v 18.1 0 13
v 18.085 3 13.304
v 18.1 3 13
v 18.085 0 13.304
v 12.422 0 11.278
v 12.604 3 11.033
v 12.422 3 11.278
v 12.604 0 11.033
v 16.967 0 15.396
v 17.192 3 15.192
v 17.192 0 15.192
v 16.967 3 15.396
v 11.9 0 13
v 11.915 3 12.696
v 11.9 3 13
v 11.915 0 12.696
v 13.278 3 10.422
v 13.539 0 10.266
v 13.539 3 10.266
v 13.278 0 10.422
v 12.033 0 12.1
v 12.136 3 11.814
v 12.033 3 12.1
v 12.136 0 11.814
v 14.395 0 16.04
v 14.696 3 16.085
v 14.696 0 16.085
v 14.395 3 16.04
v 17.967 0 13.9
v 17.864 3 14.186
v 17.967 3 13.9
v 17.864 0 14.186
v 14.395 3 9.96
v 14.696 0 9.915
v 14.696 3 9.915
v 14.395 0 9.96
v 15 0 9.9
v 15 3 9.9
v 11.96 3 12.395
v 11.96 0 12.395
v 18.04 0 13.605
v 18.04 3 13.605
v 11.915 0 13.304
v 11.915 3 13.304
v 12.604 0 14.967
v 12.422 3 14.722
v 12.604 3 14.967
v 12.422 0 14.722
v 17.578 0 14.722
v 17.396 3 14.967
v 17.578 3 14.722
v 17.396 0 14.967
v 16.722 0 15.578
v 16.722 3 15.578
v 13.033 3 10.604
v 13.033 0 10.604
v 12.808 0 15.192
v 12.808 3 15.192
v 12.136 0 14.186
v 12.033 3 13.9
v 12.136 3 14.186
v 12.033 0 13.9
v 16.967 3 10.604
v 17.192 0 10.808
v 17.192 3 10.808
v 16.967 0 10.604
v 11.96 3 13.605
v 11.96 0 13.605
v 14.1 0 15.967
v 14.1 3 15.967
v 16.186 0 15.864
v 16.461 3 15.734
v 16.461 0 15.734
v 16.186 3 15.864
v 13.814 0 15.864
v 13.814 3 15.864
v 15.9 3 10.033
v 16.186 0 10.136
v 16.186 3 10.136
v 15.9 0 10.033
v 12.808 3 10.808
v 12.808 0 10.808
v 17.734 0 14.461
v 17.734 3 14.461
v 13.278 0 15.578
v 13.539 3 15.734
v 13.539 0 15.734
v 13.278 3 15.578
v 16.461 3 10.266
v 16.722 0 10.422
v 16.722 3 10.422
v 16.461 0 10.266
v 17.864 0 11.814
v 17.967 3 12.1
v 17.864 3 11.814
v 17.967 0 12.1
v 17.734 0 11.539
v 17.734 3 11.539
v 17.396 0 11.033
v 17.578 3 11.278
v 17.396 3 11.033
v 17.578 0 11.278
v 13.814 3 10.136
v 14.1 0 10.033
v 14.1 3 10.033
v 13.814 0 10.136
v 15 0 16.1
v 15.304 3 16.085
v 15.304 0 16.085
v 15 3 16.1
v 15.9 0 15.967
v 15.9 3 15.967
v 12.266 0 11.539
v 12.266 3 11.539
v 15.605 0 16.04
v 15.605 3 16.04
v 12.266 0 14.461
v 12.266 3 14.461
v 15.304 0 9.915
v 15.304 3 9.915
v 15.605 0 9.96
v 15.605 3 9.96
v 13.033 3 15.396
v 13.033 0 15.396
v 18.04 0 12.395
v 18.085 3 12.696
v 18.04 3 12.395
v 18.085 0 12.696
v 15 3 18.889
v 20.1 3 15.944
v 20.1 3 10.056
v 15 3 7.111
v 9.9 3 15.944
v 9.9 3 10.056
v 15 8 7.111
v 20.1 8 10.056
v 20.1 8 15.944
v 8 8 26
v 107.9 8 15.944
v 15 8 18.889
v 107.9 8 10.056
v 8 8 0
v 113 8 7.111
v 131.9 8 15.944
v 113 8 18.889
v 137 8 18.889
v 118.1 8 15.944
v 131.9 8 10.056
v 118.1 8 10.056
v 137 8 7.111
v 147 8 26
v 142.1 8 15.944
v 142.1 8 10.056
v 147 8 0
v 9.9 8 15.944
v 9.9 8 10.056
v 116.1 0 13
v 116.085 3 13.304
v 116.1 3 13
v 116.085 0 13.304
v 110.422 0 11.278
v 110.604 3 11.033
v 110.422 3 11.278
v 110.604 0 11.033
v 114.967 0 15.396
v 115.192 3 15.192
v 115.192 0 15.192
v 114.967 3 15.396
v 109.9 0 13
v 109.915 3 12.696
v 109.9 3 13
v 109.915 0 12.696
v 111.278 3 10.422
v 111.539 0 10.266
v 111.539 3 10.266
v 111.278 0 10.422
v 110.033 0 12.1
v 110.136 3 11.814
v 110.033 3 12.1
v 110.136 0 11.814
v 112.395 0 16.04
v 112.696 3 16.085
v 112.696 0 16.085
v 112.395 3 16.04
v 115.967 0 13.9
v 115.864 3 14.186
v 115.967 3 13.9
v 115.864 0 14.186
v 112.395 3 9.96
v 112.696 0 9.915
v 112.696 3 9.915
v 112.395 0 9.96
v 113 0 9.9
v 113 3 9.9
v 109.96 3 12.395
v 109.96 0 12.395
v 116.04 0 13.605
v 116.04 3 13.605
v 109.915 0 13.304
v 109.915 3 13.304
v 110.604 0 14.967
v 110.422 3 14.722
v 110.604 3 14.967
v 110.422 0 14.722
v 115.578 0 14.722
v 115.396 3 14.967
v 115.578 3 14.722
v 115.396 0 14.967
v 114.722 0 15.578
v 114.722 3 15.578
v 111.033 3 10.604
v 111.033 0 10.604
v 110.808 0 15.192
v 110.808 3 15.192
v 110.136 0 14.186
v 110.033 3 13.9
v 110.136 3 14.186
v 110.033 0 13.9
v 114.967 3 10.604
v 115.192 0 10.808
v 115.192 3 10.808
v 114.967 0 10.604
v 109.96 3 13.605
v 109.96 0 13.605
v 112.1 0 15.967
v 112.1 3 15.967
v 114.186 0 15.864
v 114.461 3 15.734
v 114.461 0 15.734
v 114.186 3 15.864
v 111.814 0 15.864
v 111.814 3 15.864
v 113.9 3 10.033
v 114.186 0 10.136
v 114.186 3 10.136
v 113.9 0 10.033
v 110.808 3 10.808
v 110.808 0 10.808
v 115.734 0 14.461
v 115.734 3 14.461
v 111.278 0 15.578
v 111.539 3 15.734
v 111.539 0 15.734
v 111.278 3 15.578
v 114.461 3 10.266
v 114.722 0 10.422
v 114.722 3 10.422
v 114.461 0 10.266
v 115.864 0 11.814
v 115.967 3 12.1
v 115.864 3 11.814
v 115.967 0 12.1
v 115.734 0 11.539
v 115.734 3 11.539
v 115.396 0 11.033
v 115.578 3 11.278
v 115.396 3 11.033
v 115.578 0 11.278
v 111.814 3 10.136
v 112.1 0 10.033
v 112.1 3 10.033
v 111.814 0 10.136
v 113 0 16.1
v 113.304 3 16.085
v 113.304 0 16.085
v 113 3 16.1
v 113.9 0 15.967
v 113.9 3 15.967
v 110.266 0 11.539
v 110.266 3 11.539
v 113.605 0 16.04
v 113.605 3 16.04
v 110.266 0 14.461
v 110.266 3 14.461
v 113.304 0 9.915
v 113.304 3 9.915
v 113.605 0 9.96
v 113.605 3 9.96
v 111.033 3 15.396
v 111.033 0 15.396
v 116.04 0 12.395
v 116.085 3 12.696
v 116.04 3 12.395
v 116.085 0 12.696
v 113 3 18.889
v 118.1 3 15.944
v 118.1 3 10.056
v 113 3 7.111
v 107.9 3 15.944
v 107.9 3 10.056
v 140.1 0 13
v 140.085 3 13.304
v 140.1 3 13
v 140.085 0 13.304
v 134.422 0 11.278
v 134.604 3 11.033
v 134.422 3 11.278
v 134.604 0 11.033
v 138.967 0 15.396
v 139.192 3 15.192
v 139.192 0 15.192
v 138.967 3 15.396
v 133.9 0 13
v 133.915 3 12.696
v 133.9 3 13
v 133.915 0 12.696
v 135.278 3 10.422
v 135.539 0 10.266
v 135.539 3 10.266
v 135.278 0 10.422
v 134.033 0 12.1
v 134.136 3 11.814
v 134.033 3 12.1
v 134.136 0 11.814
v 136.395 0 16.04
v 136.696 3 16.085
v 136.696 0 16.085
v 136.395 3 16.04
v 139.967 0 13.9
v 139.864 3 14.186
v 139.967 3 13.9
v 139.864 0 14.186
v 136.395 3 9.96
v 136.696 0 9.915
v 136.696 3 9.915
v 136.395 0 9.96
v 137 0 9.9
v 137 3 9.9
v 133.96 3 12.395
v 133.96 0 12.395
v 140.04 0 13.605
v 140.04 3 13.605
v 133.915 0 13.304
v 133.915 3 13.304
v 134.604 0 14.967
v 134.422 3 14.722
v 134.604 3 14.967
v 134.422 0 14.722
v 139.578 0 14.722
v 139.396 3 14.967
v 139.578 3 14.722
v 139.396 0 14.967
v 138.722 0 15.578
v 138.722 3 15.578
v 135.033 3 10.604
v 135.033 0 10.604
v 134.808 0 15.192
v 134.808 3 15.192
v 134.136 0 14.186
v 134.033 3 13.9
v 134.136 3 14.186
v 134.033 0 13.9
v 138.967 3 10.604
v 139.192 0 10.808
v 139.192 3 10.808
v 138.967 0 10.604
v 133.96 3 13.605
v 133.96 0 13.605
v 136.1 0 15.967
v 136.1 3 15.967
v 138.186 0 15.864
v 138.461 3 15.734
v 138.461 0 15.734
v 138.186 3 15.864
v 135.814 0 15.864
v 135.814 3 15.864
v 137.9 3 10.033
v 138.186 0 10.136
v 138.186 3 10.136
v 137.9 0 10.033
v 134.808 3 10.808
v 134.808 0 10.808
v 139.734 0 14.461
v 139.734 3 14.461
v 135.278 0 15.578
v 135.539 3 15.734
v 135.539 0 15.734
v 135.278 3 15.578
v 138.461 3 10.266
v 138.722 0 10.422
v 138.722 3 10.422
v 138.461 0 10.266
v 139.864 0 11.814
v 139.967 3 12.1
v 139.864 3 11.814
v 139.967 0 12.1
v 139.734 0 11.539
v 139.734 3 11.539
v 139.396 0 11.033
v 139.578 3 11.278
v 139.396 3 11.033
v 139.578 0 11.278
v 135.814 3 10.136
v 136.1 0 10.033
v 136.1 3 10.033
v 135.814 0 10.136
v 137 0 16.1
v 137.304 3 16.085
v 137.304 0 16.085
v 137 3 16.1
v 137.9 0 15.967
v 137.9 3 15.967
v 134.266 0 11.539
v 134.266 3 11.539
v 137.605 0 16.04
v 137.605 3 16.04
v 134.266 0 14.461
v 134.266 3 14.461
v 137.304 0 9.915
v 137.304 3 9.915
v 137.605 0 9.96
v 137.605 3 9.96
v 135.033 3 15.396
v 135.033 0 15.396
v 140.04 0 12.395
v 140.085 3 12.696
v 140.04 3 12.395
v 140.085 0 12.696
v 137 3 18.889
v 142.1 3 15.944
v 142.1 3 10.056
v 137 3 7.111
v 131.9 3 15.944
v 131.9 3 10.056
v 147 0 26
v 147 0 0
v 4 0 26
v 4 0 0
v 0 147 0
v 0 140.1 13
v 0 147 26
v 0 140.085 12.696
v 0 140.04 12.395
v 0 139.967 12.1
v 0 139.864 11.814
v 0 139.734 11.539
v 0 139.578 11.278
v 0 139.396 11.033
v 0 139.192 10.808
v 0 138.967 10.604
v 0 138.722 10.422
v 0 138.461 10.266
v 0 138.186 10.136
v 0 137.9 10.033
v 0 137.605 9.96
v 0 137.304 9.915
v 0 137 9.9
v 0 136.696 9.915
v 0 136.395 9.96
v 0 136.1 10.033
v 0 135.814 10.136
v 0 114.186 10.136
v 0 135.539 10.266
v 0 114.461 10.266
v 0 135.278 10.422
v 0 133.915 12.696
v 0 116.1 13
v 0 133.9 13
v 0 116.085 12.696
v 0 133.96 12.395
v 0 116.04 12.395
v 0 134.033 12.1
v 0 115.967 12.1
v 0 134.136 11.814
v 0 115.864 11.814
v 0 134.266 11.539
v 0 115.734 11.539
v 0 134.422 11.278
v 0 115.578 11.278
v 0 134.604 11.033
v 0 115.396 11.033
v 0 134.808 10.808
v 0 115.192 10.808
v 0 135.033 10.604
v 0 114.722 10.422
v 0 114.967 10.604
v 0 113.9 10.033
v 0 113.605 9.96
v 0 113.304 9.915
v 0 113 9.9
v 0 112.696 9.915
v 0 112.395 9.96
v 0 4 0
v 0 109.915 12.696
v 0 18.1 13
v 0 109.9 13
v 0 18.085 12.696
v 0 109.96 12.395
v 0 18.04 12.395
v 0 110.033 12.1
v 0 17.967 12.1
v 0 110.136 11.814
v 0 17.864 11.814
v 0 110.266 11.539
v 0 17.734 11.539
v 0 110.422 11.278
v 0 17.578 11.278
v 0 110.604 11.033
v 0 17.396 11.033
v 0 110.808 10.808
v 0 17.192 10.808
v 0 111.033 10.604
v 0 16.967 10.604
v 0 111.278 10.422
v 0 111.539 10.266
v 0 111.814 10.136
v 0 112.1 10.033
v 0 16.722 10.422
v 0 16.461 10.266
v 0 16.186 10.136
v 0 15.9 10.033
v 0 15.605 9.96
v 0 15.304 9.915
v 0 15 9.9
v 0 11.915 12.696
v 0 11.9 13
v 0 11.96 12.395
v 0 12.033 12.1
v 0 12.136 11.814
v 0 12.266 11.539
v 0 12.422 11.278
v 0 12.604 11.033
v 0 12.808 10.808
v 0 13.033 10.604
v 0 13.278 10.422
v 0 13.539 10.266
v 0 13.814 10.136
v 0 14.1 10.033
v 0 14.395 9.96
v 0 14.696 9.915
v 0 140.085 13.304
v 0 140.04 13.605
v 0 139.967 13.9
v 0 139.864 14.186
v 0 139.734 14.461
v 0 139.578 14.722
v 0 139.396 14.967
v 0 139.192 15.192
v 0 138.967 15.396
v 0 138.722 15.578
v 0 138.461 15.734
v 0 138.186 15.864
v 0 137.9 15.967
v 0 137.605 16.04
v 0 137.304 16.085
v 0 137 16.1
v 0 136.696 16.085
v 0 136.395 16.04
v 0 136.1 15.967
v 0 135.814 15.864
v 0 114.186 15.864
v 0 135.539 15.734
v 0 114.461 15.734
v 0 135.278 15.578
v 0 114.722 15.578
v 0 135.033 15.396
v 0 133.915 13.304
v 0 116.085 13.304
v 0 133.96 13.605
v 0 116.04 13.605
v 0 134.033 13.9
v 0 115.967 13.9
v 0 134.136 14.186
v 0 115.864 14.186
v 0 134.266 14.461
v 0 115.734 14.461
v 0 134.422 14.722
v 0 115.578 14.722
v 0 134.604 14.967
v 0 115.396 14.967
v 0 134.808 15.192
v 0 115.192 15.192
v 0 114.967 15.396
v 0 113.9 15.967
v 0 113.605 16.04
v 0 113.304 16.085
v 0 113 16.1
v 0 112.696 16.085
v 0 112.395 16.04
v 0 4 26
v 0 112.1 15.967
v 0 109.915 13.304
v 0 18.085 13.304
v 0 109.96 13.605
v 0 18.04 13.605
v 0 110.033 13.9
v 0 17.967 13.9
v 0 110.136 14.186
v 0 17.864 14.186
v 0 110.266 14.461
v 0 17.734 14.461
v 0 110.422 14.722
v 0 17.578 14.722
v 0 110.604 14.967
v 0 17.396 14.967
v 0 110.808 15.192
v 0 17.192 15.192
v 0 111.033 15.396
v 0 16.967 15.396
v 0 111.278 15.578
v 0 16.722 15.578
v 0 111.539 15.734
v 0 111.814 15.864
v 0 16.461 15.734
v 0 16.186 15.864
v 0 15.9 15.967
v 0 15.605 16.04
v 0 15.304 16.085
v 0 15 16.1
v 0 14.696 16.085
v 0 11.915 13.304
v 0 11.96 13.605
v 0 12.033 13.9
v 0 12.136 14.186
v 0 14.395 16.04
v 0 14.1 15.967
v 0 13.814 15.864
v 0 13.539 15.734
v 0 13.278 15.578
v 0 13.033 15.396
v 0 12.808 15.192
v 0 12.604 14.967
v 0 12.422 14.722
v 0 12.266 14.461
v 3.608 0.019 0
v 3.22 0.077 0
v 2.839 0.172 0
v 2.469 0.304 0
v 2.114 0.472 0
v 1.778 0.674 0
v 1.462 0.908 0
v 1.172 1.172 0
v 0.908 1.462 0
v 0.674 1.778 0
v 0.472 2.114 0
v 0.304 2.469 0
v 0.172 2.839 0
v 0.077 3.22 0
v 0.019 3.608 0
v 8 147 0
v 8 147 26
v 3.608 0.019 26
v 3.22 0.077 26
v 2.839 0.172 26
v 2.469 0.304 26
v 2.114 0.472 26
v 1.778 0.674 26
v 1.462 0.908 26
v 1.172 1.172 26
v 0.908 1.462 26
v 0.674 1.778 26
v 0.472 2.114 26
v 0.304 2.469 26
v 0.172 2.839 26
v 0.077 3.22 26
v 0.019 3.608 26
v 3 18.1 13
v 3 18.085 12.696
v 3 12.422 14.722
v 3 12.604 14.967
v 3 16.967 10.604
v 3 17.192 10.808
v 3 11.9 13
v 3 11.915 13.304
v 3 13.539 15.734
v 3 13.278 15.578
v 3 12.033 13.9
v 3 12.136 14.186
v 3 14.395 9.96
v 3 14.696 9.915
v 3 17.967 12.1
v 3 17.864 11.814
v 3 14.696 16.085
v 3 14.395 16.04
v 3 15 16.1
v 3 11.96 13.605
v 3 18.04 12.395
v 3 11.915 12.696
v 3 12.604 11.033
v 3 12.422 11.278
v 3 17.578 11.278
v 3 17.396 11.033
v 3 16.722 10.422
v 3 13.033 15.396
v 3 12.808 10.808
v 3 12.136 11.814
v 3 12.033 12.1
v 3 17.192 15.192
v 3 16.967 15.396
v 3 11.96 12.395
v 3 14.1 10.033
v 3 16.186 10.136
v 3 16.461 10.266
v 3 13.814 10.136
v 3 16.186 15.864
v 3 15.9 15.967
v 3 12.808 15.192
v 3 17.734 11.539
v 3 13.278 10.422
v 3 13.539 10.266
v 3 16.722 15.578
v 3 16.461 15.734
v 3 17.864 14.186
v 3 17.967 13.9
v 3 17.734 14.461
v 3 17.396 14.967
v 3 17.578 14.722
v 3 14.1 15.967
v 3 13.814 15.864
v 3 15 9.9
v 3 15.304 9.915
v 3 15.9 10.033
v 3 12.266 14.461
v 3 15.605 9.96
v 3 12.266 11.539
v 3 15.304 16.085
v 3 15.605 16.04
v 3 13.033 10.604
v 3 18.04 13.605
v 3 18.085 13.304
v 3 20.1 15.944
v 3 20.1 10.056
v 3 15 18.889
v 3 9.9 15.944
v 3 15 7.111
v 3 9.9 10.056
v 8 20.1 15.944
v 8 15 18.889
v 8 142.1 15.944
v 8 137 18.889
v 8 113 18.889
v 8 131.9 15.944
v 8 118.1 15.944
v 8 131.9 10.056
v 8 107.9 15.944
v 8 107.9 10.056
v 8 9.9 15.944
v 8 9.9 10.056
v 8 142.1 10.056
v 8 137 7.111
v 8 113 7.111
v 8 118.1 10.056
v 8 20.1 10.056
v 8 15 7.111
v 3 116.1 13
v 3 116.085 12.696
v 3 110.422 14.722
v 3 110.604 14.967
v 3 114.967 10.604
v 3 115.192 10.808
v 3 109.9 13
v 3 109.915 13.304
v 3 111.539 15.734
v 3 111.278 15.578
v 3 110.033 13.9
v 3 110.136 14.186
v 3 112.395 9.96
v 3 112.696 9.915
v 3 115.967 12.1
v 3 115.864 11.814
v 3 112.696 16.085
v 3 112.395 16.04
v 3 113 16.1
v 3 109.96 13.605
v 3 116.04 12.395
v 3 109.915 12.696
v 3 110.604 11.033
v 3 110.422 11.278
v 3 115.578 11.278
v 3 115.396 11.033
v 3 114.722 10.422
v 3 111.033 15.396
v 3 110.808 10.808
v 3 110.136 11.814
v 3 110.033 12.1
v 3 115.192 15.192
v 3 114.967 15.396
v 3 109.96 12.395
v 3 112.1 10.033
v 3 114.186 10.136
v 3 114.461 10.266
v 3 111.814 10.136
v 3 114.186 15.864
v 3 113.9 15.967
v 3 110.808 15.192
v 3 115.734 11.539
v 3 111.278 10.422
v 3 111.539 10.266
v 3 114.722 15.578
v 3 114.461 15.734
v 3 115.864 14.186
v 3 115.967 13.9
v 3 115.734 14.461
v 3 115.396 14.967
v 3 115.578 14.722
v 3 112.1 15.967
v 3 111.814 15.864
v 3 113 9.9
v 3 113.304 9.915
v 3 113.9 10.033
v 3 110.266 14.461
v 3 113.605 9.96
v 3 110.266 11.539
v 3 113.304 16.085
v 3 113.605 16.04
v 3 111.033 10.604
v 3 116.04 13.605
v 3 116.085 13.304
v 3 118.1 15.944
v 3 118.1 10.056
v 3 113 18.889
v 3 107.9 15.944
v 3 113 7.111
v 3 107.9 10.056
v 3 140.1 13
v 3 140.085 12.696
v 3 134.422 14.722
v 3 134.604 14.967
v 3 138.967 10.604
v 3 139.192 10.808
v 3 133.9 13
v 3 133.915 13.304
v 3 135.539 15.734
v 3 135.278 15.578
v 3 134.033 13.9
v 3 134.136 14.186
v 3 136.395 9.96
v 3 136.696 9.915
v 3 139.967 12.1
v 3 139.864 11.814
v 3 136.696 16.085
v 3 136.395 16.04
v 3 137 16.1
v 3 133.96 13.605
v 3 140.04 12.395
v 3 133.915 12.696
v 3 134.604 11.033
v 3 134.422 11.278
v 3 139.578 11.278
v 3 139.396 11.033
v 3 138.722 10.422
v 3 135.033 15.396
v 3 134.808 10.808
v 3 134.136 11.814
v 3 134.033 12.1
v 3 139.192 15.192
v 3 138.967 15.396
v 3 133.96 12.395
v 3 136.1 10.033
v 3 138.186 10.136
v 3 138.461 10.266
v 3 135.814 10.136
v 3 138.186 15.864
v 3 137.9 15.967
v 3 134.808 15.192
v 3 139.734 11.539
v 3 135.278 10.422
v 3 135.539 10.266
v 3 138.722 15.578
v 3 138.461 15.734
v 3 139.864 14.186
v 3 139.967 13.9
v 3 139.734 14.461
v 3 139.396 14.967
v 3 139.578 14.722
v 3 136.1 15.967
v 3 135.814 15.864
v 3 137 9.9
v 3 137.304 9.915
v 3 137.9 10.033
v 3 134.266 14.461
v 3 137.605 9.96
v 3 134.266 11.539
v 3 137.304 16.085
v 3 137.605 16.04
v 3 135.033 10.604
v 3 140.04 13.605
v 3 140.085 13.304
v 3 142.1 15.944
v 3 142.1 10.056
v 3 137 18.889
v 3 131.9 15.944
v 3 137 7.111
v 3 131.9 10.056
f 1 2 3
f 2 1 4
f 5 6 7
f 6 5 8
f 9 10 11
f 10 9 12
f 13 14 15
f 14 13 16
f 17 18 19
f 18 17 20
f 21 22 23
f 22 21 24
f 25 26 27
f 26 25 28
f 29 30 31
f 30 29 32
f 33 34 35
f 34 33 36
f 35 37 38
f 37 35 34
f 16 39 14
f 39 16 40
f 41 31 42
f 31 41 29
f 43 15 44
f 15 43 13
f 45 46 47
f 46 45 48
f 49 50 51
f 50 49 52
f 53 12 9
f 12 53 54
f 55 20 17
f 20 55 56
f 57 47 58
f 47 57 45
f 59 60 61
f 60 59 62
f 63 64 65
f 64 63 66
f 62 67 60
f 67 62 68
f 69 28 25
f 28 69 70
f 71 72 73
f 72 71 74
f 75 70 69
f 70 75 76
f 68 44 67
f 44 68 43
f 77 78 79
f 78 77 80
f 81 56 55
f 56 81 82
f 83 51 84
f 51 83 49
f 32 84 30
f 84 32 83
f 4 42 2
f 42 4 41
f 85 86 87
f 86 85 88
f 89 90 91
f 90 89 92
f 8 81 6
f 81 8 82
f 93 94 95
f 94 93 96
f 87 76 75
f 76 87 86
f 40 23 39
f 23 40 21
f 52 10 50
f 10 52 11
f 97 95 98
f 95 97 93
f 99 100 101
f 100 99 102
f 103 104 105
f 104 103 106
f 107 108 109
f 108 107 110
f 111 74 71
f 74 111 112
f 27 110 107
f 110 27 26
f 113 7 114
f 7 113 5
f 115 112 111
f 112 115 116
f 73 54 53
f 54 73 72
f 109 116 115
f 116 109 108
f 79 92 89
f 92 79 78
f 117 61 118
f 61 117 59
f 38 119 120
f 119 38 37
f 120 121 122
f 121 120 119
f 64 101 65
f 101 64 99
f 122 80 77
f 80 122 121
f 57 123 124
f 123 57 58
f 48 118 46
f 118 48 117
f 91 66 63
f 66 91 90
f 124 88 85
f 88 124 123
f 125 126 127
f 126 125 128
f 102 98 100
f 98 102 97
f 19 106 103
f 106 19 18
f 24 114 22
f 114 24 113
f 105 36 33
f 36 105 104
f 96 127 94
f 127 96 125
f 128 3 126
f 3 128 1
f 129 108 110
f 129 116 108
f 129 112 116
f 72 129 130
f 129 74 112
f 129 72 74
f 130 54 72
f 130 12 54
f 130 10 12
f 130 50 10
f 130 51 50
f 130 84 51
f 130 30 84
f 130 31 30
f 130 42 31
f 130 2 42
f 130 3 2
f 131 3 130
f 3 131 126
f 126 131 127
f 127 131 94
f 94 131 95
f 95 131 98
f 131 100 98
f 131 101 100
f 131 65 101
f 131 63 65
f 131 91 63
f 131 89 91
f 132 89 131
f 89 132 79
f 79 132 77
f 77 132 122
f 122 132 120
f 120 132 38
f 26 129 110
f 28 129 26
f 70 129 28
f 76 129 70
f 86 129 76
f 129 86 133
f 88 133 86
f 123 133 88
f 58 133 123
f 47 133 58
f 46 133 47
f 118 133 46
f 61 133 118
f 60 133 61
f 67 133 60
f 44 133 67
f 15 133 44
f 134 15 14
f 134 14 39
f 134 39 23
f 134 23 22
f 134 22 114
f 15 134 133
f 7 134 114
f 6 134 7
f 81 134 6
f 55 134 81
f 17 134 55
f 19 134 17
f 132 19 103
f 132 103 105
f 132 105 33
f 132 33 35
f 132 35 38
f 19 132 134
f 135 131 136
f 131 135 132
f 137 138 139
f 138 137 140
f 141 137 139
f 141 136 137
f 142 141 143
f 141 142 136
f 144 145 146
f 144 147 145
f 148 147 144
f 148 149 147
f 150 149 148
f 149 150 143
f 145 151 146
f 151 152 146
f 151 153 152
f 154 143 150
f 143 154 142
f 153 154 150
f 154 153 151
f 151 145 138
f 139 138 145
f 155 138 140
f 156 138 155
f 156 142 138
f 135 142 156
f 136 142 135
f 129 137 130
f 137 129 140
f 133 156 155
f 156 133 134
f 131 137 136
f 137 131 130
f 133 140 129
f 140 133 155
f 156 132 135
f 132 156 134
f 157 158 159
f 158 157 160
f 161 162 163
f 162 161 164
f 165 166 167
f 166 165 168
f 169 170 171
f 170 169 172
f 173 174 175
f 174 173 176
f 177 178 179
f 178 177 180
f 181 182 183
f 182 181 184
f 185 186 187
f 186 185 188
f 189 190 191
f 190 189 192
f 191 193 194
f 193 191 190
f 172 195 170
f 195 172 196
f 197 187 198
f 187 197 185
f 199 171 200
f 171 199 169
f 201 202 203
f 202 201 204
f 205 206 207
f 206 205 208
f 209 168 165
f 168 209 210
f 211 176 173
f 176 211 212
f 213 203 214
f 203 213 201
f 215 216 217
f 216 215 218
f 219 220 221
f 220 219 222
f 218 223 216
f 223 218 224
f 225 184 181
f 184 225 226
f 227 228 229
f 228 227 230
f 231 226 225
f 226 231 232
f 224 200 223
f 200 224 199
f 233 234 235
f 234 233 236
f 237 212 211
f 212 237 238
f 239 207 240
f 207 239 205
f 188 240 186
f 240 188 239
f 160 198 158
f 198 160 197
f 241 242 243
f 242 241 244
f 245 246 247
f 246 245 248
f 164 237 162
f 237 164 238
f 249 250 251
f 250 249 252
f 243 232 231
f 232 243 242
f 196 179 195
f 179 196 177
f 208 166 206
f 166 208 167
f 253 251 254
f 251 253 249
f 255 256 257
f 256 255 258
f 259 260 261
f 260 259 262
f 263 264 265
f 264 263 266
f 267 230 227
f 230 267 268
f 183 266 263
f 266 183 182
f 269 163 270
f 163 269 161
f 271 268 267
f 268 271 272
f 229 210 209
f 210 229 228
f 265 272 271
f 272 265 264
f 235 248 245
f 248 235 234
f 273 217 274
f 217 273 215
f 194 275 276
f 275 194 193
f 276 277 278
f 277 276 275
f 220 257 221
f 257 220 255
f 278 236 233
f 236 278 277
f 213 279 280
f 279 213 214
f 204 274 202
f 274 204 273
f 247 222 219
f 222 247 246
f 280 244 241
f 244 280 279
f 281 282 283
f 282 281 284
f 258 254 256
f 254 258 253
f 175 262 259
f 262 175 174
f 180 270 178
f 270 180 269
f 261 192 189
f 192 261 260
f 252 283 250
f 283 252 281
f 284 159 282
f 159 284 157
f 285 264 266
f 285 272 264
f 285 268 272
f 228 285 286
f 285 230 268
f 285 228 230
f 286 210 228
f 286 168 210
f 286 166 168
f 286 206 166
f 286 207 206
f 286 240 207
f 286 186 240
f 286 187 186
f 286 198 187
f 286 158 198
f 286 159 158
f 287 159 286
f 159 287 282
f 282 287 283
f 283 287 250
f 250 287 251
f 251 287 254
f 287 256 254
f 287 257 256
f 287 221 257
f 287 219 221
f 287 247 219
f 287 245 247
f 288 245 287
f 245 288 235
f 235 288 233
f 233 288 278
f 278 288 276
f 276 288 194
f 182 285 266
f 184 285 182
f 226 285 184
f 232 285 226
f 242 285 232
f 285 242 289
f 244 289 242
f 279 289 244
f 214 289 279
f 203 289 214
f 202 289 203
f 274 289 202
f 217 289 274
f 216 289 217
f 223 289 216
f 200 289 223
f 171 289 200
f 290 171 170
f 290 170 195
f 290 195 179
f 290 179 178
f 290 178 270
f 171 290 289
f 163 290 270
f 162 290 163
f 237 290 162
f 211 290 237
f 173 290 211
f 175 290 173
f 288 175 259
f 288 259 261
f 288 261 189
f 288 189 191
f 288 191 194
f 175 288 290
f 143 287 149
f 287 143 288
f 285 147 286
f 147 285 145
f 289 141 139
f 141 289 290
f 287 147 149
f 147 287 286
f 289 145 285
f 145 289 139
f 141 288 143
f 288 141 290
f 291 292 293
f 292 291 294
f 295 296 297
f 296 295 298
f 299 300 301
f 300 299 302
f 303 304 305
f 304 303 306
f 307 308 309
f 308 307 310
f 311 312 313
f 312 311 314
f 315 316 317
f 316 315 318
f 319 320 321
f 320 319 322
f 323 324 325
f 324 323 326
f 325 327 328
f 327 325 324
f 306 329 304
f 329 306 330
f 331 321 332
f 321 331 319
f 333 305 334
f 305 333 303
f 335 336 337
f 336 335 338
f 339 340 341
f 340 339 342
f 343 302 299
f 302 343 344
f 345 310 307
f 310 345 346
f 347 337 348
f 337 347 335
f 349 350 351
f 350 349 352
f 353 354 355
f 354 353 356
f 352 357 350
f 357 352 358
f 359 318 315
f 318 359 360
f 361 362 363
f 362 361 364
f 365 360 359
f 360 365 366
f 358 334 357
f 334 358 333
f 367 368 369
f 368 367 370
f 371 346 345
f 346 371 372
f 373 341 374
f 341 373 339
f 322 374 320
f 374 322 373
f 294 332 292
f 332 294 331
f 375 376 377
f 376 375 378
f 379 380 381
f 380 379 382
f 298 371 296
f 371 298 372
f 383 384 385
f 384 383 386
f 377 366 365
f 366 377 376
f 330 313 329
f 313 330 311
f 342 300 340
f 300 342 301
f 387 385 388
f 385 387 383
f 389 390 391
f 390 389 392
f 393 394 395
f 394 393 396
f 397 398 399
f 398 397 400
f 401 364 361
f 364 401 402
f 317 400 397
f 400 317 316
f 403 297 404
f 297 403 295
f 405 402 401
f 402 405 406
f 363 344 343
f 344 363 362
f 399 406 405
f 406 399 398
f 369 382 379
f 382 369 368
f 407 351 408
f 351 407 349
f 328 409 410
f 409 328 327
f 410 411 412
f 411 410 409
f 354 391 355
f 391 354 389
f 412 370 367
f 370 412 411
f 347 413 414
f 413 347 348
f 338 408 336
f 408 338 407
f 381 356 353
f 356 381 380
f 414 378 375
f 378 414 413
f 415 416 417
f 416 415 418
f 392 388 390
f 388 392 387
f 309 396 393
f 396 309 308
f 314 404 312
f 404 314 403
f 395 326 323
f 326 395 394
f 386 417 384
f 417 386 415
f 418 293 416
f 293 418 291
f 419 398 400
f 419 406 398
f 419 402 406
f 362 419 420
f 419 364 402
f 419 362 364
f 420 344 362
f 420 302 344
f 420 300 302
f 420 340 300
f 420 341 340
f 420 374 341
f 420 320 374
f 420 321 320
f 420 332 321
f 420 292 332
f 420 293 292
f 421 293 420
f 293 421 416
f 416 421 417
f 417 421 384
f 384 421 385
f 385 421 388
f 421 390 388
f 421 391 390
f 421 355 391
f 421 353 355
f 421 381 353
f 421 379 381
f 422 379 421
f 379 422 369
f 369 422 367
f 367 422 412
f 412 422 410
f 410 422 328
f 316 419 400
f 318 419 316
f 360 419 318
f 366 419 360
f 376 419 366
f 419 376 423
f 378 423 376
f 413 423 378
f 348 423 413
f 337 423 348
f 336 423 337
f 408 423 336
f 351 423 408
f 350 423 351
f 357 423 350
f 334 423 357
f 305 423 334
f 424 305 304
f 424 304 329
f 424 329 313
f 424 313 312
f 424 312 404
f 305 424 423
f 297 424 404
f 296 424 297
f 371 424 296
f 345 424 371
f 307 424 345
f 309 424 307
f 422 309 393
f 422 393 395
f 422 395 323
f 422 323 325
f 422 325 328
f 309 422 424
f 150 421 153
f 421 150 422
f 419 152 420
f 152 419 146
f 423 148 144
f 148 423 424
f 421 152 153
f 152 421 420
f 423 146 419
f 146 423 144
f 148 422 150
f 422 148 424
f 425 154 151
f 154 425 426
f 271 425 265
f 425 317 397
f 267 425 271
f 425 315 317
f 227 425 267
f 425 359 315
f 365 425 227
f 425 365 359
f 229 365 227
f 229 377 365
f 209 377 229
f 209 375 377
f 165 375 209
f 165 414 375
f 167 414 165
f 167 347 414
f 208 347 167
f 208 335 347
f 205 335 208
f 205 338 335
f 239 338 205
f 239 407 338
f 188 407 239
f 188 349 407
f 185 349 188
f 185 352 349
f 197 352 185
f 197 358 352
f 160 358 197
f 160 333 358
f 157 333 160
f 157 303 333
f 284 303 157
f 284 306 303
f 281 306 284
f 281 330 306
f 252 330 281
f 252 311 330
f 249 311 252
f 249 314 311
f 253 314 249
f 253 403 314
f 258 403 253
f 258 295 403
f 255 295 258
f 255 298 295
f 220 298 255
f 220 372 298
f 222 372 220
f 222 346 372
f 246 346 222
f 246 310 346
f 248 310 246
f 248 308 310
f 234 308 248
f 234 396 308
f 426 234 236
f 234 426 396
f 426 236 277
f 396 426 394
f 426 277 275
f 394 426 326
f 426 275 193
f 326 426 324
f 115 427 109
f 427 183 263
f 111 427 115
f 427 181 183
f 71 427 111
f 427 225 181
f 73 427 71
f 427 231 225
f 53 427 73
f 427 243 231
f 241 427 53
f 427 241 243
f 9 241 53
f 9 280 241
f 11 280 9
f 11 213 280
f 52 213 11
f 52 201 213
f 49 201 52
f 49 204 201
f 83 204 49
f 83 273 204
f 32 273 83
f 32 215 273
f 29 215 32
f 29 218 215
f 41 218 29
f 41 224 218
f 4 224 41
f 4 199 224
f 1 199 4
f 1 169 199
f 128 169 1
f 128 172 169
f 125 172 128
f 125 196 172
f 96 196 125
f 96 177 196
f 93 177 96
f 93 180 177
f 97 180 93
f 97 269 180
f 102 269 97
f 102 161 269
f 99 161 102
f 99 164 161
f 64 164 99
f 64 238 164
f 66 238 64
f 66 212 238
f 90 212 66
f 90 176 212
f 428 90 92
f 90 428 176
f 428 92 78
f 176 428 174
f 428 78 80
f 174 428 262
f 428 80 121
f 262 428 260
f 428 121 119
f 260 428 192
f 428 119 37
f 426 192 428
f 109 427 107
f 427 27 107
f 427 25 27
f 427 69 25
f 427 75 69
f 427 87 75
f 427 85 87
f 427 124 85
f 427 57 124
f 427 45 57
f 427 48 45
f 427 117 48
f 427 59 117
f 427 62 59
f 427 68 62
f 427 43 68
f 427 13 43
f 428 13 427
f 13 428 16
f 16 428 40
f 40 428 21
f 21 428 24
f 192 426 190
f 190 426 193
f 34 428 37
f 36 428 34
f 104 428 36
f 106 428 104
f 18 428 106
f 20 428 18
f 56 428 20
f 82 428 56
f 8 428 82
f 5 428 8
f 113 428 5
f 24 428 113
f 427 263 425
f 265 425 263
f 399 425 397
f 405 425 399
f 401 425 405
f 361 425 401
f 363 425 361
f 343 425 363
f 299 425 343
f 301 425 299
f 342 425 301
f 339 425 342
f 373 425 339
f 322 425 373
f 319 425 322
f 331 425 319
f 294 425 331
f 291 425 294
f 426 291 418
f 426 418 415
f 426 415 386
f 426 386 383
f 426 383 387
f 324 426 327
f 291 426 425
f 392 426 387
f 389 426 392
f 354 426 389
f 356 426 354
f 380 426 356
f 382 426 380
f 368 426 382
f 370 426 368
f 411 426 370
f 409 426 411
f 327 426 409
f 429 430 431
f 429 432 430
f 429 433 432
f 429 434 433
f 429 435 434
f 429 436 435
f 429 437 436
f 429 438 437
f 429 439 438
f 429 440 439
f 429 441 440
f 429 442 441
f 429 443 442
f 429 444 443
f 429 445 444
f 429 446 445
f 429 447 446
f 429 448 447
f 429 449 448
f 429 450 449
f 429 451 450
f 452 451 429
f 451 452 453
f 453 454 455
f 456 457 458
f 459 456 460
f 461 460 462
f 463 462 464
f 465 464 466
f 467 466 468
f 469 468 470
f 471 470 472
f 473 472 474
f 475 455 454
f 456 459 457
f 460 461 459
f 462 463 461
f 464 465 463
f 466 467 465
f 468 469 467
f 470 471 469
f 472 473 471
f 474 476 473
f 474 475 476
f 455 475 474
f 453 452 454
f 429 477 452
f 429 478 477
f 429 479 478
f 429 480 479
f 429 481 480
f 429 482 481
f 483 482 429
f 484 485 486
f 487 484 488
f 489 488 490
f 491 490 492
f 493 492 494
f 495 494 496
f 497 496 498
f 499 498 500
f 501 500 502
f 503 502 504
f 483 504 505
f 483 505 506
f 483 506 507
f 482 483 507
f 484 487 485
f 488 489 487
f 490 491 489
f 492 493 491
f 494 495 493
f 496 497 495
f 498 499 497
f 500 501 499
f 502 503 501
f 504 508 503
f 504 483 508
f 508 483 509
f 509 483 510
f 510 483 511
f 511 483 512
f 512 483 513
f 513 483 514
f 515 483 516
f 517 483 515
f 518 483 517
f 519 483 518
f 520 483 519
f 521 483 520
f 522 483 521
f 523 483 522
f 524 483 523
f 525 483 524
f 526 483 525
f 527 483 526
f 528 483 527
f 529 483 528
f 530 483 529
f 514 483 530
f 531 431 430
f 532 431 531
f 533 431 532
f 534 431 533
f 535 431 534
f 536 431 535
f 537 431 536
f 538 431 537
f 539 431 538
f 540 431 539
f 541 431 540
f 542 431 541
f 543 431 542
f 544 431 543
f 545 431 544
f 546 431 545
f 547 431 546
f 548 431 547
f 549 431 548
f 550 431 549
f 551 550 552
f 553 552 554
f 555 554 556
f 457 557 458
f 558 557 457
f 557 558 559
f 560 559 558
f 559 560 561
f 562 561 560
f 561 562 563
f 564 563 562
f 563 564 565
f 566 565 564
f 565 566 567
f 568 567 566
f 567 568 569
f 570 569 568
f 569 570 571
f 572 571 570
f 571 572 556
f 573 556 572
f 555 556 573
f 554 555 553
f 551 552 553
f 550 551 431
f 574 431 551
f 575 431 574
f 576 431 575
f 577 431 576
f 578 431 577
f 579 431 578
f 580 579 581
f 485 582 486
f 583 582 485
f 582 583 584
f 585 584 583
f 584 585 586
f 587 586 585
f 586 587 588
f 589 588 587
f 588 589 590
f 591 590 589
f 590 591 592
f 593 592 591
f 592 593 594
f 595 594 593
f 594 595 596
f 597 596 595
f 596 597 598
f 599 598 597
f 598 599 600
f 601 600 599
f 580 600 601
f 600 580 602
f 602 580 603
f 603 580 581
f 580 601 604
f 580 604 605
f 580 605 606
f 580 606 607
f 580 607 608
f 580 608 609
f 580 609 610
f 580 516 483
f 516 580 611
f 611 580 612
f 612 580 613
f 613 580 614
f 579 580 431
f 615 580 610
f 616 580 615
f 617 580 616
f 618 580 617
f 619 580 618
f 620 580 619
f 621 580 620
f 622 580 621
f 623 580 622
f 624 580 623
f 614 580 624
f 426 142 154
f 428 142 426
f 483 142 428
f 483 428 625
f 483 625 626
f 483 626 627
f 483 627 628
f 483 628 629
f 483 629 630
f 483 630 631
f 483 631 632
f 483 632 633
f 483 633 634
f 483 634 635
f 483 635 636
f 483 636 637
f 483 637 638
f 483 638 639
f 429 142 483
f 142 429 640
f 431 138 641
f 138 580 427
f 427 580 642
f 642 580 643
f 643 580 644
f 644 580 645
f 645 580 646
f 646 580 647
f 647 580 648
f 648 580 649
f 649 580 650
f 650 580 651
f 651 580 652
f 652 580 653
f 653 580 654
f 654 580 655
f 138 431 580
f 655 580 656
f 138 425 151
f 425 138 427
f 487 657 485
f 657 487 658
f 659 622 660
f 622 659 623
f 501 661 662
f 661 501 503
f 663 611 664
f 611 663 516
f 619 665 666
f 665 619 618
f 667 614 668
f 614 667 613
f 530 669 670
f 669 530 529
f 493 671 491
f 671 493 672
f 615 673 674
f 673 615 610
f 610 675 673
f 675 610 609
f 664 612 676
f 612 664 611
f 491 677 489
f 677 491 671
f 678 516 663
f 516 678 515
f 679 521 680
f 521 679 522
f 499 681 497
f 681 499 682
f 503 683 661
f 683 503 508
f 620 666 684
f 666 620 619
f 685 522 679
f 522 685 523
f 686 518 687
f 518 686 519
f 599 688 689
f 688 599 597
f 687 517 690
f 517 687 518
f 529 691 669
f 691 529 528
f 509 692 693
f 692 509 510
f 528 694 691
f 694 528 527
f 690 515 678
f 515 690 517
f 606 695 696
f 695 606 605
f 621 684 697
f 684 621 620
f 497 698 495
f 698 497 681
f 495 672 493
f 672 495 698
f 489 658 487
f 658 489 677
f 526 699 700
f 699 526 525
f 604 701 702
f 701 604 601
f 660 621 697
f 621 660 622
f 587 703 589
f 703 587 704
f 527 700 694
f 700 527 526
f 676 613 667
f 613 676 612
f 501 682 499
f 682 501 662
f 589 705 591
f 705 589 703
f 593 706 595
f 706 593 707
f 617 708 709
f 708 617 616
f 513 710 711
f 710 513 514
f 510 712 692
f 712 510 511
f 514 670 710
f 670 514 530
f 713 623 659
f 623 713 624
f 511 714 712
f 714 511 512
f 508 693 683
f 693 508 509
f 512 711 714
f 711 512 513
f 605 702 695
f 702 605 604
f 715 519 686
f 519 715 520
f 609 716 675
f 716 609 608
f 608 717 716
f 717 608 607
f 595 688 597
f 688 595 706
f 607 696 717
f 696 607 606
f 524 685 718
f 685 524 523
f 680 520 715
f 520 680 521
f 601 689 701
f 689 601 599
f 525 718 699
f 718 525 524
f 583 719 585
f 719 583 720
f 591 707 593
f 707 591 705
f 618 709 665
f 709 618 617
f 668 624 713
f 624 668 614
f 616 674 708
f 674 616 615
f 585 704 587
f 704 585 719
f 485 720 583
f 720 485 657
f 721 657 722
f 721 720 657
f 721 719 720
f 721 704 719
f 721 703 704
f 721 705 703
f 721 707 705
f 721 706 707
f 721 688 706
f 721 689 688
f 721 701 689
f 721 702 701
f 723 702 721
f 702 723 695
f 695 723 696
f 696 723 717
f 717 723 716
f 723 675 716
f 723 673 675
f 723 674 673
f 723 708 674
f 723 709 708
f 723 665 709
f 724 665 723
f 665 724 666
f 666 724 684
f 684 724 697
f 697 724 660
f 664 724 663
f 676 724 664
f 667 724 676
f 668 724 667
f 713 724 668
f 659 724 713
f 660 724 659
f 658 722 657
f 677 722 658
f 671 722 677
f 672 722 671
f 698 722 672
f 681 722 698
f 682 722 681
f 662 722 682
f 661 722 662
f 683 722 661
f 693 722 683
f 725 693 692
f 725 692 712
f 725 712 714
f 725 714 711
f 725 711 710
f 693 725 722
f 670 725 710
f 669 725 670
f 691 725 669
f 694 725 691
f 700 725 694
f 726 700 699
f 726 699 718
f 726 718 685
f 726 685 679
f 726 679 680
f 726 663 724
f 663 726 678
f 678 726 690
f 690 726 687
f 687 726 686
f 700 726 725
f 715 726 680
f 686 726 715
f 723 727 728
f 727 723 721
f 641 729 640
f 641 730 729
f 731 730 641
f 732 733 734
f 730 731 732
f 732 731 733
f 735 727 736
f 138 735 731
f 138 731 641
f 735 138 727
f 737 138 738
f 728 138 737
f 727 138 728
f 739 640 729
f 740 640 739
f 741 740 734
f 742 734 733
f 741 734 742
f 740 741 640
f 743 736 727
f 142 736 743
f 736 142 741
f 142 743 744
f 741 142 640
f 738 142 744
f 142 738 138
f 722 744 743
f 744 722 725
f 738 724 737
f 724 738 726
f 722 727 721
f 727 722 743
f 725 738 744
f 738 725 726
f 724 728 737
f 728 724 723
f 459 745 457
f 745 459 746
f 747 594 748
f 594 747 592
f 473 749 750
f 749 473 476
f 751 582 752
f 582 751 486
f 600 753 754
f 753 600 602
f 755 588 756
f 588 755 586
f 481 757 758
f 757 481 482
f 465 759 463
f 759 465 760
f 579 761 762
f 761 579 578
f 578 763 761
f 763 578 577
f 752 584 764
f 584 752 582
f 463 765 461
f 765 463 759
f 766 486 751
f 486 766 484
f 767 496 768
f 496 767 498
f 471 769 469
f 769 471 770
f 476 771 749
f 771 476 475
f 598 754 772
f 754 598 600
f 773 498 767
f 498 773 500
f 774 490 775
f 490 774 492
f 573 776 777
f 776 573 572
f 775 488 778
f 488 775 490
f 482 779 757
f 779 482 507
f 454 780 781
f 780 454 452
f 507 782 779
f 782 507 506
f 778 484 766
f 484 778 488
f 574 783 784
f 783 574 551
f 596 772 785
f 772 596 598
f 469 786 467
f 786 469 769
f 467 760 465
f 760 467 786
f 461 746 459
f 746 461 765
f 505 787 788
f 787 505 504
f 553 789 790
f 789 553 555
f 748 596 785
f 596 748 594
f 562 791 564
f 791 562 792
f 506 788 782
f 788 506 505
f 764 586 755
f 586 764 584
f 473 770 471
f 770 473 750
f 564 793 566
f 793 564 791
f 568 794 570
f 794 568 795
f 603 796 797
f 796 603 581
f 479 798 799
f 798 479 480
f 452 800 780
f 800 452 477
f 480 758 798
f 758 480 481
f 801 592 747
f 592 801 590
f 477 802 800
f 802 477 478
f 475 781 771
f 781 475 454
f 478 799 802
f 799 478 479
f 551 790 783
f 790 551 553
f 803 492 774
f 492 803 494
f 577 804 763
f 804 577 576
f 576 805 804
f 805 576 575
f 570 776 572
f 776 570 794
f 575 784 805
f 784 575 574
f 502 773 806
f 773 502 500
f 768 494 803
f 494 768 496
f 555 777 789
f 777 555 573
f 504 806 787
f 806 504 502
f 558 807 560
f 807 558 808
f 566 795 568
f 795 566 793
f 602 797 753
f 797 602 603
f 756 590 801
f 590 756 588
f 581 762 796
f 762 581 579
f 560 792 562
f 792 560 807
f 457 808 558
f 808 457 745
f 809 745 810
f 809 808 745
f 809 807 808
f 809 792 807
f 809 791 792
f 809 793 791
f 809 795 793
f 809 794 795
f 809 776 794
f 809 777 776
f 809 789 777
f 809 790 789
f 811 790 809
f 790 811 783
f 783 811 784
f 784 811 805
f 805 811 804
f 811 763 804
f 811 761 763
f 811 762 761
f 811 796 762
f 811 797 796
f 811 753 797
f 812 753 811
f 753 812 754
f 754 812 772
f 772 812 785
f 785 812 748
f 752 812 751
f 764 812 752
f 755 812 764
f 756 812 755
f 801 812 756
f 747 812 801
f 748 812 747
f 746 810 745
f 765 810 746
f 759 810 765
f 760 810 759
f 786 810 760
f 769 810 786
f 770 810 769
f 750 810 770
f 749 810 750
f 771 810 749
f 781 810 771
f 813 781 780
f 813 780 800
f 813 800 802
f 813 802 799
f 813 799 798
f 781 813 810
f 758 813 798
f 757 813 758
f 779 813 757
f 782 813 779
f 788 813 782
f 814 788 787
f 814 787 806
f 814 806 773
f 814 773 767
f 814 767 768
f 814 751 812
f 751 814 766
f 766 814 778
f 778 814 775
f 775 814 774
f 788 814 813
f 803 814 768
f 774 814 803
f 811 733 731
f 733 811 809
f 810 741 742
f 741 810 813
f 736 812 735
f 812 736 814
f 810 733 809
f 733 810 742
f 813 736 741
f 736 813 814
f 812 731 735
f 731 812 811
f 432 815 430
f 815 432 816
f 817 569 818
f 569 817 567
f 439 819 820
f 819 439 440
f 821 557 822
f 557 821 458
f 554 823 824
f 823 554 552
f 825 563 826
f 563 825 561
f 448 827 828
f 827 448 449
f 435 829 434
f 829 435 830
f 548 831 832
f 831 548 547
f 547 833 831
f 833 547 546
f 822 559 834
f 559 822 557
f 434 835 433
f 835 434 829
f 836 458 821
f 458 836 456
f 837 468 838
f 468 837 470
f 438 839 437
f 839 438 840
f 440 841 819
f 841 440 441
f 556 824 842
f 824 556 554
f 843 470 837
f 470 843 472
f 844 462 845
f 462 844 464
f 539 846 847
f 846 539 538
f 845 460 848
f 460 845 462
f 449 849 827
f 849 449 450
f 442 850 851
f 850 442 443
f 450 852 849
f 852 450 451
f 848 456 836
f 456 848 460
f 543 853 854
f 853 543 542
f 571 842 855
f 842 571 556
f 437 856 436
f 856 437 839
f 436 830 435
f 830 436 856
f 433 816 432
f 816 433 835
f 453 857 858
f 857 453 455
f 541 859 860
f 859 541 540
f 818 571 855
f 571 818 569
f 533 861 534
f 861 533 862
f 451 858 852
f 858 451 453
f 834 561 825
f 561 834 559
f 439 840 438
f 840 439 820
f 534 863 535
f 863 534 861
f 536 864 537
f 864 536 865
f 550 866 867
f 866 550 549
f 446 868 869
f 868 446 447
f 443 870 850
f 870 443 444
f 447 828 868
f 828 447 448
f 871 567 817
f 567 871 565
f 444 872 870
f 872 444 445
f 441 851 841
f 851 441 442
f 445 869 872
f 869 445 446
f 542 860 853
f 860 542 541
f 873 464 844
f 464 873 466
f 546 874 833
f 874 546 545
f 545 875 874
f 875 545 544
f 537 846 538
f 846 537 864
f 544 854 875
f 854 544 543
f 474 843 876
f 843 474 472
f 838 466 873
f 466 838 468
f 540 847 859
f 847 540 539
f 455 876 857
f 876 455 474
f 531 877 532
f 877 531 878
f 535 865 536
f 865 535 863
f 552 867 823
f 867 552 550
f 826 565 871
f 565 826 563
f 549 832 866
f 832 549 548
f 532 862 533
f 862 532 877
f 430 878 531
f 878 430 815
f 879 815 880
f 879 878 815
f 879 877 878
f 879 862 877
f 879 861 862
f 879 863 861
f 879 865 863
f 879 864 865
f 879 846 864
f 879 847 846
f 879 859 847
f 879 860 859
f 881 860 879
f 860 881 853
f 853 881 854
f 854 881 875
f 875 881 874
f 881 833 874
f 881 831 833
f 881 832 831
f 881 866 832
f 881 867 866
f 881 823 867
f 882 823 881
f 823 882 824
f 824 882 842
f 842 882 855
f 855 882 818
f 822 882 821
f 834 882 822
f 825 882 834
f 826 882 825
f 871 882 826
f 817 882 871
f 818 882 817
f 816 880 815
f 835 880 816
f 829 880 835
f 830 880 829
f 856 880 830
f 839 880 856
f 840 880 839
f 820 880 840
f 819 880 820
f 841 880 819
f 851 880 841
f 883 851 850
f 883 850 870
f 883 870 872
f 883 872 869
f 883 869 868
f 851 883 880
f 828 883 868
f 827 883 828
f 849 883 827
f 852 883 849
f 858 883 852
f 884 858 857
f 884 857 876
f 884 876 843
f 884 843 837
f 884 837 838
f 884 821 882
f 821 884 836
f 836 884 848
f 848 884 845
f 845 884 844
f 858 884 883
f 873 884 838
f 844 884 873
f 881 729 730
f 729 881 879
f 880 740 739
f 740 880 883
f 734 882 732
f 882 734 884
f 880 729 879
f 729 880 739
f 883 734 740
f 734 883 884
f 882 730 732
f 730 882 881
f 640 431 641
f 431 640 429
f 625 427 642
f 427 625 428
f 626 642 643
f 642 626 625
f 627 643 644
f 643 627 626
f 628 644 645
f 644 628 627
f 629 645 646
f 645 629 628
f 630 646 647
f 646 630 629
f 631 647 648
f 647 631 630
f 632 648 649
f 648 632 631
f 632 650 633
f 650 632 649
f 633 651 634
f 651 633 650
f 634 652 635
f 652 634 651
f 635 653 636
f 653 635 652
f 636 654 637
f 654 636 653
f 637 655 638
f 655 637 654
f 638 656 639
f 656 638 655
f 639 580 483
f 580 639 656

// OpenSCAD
// file: ../../../modules/bolts.scad
module nut_trap(d, h) {
  linear_extrude(height = h, center = true)
  circle(d = d / cos(30), $fn = 6);
}

module bolt_hole(d, h) {
  linear_extrude(height = h, center = true)
  circle(d = d, $fn = 64);
}

module m3_bolt_hole_with_nut (x, y, h) {
  nut_thickness = 2.4;

  union() {
    translate([0, 0, h / 2])
    bolt_hole(d = 3.4, h = h + 1);
    
    // cylinder center is at h/2, so we need to move it up.
    // We want the nut to be from (h - nut_thickness) to h.
    // The center of the nut will be at h - (nut_thickness / 2).
    translate([0, 0, h - nut_thickness / 2])
    rotate([0, 0, 90])
    nut_trap(d = 5.7, h = nut_thickness);
  }
}

module m4_bolt_hole_with_nut (h) {
  nut_thickness = 3.2;

  union() {
    translate([0, 0, h / 2])
    bolt_hole(d = 4.4, h = h + 1);
    
    translate([0, 0, h - nut_thickness / 2])
    rotate([0, 0, 90])
    nut_trap(d = 7.2, h = nut_thickness);
  }
}

module m6_bolt_hole_with_nut (h) {
  nut_thickness = 5;

  union() {
    translate([0, 0, h / 2])
    bolt_hole(d = 6.2, h = h + 1);
    
    translate([0, 0, h - nut_thickness / 2])
    rotate([0, 0, 90])
    nut_trap(d = 10.2, h = nut_thickness);
  }
}

module m8_bolt_hole_with_nut (h) {
  nut_thickness = 6.5;

  union() {
    translate([0, 0, h / 2])
    bolt_hole(d = 8.4, h = h + 1);
    
    translate([0, 0, h - nut_thickness / 2])
    rotate([0, 0, 90])
    nut_trap(d = 13.3, h = nut_thickness);
  }
}

// Hex holes for self-tapping (nominal - 0.2mm)
module hex_hole(flat_d, h) {
  linear_extrude(height = h, center = true)
  circle(d = flat_d / cos(30), $fn = 6);
}

module m3_bolt_hexhole(h) {
  rotate([0, 0, 90])
  hex_hole(flat_d = 2.8, h = h);
}

module m4_bolt_hexhole(h) {
  rotate([0, 0, 90])
  hex_hole(flat_d = 3.8, h = h);
}

module m6_bolt_hexhole(h) {
  rotate([0, 0, 90])
  hex_hole(flat_d = 5.8, h = h);
}

module m8_bolt_hexhole(h) {
  rotate([0, 0, 90])
  hex_hole(flat_d = 7.8, h = h);
}
// main file
use <../../../modules/bolts.scad>;
width = 147;
height = 26;
deps = 8;
radius = 4;

difference() {
  union(){
    translate([0, 0, height])
    rotate([90, 180, 180])
    long_bar(width, height, deps);
    
    translate([0, 0, 0])
    rotate([90, 0, 90])
    long_bar(width, height, deps);
  }

  translate([deps / 2, deps / 2, 0])
  rotate([0, 0, 180])
  fillet_profile(radius, height * 2 + 1);
}

module fillet_profile(r, h) {
  linear_extrude(height = h, center = true)
  difference() {
    square([r, r]);
    circle(r = r, $fn = 64);
  }
}

module long_bar (w, y, h) {
  difference() {
    translate([w / 2, y / 2, h / 2])
    cube([w, y, h], center=true);

    translate([15, y / 2, 0])
    m6_bolt_hole_with_nut(h);
    translate([15 + 98, y / 2, 0])
    m6_bolt_hole_with_nut(h);
    translate([15 + 98 + 24, y / 2, 0])
    m6_bolt_hole_with_nut(h);
  }
}
